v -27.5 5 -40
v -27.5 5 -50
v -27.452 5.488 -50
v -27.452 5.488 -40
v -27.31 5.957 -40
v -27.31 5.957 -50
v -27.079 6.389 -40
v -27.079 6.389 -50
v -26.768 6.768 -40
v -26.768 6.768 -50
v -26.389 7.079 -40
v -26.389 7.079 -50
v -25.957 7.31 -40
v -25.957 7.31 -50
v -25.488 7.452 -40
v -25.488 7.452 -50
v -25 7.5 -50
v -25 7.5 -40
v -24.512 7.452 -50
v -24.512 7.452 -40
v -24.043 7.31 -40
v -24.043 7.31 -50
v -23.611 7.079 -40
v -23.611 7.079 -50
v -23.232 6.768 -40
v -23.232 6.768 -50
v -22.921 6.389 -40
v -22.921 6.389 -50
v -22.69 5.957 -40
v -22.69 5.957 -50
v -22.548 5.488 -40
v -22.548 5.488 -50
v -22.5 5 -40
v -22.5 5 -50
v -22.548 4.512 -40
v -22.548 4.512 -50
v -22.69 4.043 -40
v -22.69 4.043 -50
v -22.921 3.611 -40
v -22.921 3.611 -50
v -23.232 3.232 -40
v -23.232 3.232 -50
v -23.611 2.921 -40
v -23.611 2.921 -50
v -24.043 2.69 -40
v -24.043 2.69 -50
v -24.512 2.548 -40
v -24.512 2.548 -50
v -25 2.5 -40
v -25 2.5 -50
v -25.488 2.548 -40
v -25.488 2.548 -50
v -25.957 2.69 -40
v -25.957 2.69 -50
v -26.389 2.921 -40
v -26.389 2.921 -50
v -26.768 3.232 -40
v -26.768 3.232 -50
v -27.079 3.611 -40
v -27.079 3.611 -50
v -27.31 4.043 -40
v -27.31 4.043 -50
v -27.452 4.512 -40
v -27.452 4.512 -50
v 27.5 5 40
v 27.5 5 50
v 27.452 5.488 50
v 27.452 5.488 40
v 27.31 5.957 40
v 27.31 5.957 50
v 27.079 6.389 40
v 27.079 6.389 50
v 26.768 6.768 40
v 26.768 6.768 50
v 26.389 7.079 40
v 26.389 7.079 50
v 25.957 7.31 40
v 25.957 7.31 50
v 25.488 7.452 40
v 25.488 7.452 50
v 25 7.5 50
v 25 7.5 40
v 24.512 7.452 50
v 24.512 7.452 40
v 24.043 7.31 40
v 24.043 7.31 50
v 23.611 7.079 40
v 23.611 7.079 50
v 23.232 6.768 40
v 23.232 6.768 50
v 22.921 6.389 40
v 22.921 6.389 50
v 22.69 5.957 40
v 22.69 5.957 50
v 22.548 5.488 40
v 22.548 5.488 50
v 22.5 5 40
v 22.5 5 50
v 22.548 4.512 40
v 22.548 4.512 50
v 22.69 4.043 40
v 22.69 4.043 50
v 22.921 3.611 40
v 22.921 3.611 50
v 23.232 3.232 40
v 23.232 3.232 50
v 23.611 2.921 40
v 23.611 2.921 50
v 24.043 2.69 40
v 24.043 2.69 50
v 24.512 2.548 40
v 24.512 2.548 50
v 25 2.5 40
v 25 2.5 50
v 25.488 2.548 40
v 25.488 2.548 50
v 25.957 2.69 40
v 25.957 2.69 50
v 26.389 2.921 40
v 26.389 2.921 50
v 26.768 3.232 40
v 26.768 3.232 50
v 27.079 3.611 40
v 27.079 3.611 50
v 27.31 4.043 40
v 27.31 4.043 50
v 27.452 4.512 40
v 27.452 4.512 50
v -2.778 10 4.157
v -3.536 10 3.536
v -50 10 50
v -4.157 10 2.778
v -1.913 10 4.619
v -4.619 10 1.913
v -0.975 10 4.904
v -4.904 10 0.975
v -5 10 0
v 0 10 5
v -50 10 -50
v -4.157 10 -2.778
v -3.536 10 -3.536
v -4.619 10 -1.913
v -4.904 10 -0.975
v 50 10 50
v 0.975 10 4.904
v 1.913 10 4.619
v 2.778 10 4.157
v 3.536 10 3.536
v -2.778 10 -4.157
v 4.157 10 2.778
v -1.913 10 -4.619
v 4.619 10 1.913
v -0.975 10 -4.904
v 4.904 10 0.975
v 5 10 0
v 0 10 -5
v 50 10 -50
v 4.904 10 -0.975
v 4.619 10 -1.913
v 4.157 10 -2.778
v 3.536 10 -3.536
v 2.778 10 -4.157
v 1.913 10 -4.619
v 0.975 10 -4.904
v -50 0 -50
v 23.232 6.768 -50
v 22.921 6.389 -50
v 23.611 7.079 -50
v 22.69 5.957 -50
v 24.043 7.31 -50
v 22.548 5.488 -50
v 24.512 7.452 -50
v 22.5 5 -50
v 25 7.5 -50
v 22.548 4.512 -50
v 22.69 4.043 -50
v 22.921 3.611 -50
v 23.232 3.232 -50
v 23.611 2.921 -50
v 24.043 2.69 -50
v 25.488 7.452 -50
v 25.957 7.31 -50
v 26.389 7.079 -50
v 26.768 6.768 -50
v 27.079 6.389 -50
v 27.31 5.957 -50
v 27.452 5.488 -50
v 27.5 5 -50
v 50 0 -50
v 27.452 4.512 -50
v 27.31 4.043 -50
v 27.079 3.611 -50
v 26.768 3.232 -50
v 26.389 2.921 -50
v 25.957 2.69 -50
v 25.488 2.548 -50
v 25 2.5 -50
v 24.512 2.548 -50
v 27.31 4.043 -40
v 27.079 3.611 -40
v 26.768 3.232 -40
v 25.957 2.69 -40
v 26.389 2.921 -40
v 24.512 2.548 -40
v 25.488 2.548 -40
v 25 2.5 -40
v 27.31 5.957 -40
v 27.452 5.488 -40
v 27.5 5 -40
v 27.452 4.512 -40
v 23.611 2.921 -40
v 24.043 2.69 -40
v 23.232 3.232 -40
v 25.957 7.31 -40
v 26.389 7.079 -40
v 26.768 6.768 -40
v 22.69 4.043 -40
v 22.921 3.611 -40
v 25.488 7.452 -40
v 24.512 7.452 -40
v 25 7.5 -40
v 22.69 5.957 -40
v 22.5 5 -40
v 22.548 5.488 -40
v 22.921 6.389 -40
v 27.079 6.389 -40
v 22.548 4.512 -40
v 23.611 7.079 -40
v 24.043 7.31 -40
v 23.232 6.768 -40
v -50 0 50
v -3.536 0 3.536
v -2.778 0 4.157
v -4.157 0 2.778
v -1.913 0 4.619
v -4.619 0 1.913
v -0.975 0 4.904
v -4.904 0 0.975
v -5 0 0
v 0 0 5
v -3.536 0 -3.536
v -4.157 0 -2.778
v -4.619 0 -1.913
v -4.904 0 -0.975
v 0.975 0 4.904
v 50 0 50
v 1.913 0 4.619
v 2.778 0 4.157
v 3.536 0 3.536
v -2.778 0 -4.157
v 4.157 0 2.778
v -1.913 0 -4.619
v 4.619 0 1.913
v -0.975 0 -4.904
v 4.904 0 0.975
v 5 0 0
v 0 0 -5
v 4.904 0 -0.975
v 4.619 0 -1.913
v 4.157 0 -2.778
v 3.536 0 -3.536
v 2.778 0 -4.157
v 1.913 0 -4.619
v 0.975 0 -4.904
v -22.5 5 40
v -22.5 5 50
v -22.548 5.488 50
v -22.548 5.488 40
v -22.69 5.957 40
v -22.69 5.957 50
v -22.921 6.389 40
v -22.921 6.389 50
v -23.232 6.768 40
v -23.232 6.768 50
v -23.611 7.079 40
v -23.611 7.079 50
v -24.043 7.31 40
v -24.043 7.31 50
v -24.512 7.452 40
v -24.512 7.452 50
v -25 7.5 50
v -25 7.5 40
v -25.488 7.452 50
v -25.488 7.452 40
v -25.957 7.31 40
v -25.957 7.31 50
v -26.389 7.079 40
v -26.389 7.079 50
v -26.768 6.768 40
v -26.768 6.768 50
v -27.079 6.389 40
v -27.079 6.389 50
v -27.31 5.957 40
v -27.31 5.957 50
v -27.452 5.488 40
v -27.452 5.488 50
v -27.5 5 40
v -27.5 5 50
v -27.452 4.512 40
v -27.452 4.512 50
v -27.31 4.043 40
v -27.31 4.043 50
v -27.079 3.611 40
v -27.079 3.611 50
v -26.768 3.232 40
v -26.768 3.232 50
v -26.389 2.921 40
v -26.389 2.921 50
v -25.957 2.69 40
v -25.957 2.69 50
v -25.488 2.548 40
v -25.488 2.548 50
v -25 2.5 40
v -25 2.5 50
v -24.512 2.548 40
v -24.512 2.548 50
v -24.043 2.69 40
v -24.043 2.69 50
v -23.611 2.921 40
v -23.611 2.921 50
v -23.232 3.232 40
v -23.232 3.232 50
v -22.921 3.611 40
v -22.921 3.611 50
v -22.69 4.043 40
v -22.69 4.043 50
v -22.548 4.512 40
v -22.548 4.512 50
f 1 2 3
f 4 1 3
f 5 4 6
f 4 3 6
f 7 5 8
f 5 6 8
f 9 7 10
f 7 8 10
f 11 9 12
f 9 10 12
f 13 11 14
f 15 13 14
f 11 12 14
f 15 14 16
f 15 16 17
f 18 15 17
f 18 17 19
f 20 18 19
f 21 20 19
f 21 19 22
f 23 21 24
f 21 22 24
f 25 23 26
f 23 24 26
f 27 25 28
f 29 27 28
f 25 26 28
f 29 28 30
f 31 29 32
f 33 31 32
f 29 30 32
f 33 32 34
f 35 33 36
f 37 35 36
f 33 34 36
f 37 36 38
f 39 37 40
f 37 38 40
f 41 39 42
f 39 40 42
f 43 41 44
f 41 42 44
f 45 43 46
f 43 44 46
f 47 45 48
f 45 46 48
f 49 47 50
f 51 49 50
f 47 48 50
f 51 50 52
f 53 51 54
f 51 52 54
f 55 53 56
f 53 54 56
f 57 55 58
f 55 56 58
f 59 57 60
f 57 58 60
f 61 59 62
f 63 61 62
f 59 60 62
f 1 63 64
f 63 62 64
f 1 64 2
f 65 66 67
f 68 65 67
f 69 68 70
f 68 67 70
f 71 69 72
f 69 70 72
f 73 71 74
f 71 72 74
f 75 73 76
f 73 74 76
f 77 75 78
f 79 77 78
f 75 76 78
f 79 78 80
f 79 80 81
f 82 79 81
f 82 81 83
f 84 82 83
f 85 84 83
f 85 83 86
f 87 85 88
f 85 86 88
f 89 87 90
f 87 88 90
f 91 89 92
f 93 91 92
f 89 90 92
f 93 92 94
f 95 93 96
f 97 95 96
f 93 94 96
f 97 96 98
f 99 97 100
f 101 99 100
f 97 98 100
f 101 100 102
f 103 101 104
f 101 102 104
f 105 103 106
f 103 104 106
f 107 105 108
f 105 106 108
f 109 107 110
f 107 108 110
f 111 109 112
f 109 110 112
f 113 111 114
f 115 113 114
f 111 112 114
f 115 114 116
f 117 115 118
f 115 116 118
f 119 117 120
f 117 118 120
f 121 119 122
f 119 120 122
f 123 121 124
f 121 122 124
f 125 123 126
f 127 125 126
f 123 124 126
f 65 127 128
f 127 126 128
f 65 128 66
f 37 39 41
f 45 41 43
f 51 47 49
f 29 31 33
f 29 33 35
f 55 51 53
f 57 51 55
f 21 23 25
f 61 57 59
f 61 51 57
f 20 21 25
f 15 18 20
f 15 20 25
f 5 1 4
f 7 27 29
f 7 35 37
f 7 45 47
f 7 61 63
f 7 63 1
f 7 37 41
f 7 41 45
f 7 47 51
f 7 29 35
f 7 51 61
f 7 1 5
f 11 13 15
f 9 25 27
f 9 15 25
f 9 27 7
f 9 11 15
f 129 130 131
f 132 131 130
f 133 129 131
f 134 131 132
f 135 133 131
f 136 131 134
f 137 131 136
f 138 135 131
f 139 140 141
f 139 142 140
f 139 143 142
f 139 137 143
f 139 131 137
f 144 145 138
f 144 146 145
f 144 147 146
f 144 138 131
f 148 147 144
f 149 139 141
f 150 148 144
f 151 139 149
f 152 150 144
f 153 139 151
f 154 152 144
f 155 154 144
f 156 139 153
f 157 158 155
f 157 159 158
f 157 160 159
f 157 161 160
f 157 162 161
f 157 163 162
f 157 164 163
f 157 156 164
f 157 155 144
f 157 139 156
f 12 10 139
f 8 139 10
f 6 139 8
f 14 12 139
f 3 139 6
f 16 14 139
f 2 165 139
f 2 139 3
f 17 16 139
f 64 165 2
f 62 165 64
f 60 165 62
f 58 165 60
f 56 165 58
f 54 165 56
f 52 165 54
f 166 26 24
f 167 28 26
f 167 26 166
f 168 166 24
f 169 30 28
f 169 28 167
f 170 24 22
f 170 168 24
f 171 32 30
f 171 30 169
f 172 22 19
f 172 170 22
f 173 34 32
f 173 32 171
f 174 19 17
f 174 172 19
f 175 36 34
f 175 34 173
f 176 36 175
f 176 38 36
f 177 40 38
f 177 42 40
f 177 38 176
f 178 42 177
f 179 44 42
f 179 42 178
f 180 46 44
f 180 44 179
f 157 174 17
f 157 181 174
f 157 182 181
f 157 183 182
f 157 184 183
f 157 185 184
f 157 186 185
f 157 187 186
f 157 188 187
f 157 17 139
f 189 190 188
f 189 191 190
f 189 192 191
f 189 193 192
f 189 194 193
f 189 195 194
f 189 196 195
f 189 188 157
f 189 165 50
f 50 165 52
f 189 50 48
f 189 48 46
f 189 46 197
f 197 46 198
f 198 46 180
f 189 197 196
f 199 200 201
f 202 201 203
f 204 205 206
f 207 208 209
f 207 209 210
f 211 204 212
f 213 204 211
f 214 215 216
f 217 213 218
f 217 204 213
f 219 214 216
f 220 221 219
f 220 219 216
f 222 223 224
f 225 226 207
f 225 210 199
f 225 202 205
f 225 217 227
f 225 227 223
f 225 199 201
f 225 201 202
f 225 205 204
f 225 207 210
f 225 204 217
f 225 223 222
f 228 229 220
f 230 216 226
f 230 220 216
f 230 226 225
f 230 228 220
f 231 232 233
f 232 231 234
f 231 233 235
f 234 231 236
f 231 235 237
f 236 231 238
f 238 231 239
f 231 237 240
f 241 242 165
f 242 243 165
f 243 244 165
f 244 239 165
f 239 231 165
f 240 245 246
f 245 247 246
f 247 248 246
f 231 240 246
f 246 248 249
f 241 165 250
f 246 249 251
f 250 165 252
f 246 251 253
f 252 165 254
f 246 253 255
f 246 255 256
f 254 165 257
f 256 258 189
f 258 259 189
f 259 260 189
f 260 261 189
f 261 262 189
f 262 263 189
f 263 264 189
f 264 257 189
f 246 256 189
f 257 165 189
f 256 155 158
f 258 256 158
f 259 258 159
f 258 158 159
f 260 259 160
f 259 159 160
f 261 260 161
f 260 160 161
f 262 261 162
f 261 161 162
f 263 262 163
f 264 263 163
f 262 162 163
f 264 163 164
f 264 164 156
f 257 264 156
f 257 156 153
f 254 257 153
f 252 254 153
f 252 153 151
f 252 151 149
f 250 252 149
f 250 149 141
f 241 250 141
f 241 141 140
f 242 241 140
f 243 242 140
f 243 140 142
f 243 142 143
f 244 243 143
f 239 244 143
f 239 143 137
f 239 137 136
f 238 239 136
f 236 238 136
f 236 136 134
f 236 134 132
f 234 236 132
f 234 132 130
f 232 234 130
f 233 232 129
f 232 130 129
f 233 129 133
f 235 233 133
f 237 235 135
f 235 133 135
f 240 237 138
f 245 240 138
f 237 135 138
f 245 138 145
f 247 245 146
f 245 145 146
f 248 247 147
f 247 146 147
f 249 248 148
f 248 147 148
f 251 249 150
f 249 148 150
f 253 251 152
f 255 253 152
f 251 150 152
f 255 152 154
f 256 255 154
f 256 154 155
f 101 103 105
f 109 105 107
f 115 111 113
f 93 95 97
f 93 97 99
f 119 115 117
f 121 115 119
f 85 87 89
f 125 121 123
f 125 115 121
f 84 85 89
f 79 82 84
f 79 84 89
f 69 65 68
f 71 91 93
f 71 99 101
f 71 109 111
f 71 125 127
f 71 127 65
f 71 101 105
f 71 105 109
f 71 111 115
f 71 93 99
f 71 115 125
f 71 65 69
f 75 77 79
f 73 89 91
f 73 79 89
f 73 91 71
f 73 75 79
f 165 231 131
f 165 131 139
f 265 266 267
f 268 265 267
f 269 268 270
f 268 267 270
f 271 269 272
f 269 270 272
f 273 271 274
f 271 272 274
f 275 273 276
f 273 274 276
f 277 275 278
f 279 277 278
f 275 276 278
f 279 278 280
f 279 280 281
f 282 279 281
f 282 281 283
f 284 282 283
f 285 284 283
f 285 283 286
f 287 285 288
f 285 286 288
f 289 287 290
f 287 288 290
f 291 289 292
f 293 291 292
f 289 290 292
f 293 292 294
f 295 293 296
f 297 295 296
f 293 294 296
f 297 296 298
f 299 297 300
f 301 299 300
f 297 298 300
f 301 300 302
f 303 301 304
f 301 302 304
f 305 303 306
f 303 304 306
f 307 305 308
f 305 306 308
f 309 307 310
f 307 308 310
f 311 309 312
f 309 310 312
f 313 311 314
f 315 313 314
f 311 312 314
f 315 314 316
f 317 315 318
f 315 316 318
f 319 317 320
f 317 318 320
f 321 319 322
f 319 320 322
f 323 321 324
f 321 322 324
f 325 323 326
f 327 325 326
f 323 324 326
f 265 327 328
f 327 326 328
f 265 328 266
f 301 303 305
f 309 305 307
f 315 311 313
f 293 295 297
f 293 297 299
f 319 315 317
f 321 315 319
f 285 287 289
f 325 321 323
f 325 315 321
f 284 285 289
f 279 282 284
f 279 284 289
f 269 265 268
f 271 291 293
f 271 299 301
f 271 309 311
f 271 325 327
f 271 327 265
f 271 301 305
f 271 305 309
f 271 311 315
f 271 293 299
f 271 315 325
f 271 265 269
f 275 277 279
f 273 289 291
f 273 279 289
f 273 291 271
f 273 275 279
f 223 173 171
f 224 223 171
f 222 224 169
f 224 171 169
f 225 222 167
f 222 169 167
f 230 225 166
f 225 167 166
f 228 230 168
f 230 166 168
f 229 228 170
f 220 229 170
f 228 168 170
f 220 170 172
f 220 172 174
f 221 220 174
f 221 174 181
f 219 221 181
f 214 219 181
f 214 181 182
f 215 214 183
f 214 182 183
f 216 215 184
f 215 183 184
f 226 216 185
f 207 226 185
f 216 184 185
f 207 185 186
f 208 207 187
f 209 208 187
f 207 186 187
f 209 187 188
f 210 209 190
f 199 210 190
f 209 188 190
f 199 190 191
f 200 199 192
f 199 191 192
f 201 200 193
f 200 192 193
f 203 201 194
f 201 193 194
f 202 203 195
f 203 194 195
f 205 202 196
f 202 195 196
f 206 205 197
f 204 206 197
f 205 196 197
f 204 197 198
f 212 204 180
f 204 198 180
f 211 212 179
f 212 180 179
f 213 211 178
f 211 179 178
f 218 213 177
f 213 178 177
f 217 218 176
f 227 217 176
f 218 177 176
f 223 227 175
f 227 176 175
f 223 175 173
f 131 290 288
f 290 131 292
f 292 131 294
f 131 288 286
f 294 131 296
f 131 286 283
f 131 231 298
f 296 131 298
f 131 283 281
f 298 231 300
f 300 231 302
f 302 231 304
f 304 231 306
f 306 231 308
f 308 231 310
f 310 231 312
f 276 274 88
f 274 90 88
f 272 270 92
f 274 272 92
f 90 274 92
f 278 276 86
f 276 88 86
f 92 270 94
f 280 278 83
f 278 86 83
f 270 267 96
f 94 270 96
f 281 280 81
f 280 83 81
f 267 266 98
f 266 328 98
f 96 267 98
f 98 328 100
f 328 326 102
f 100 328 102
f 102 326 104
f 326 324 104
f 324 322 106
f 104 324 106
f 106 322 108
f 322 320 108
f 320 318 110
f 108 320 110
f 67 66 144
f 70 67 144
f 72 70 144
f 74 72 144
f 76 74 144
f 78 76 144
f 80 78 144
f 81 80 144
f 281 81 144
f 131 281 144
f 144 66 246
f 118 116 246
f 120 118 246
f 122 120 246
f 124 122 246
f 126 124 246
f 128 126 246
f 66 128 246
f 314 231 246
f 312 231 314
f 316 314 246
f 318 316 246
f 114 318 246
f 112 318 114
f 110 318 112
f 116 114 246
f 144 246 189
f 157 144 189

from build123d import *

# Parameters (mm, degrees)
SKETCH_1_W          = 100
SKETCH_1_H          = 100
EXTRUDE_1_DEPTH     = 10
SKETCH_2_R          = 2.5
CUT_EXTRUDE_1_DEPTH = 10
SKETCH_3_R          = 2.5
CUT_EXTRUDE_2_DEPTH = 10
SKETCH_4_R          = 5
CUT_EXTRUDE_3_DEPTH = 11


with BuildPart() as part:
    # Эскиз1 → Бобышка-Вытянуть1 (new body)
    with BuildSketch(Plane(origin=(0, 0, 0), x_dir=(1, 0, 0), z_dir=(0, 1, 0))):
        Rectangle(SKETCH_1_W, SKETCH_1_H)
    extrude(amount=EXTRUDE_1_DEPTH)

    # Эскиз2 → Вырез-Вытянуть1 (cut)
    with BuildSketch(Plane.XY.offset(50)):
        with Locations((-25, 5)):
            Circle(SKETCH_2_R)
        with Locations((25, 5)):
            Circle(SKETCH_2_R)
    extrude(amount=-CUT_EXTRUDE_1_DEPTH, mode=Mode.SUBTRACT)

    # Эскиз3 → Вырез-Вытянуть2 (cut)
    with BuildSketch(Plane(origin=(0, 0, -50), x_dir=(-1, 0, 0), z_dir=(0, 0, -1))):
        with Locations((-25, 5)):
            Circle(SKETCH_3_R)
        with Locations((25, 5)):
            Circle(SKETCH_3_R)
    extrude(amount=-CUT_EXTRUDE_2_DEPTH, mode=Mode.SUBTRACT)

    # Эскиз4 → Вырез-Вытянуть3 (cut, through all)
    with BuildSketch(Plane(origin=(0, 10, 0), x_dir=(1, 0, 0), z_dir=(0, 1, 0))):
        Circle(SKETCH_4_R)
    extrude(amount=-CUT_EXTRUDE_3_DEPTH, mode=Mode.SUBTRACT)


solid = part.part
